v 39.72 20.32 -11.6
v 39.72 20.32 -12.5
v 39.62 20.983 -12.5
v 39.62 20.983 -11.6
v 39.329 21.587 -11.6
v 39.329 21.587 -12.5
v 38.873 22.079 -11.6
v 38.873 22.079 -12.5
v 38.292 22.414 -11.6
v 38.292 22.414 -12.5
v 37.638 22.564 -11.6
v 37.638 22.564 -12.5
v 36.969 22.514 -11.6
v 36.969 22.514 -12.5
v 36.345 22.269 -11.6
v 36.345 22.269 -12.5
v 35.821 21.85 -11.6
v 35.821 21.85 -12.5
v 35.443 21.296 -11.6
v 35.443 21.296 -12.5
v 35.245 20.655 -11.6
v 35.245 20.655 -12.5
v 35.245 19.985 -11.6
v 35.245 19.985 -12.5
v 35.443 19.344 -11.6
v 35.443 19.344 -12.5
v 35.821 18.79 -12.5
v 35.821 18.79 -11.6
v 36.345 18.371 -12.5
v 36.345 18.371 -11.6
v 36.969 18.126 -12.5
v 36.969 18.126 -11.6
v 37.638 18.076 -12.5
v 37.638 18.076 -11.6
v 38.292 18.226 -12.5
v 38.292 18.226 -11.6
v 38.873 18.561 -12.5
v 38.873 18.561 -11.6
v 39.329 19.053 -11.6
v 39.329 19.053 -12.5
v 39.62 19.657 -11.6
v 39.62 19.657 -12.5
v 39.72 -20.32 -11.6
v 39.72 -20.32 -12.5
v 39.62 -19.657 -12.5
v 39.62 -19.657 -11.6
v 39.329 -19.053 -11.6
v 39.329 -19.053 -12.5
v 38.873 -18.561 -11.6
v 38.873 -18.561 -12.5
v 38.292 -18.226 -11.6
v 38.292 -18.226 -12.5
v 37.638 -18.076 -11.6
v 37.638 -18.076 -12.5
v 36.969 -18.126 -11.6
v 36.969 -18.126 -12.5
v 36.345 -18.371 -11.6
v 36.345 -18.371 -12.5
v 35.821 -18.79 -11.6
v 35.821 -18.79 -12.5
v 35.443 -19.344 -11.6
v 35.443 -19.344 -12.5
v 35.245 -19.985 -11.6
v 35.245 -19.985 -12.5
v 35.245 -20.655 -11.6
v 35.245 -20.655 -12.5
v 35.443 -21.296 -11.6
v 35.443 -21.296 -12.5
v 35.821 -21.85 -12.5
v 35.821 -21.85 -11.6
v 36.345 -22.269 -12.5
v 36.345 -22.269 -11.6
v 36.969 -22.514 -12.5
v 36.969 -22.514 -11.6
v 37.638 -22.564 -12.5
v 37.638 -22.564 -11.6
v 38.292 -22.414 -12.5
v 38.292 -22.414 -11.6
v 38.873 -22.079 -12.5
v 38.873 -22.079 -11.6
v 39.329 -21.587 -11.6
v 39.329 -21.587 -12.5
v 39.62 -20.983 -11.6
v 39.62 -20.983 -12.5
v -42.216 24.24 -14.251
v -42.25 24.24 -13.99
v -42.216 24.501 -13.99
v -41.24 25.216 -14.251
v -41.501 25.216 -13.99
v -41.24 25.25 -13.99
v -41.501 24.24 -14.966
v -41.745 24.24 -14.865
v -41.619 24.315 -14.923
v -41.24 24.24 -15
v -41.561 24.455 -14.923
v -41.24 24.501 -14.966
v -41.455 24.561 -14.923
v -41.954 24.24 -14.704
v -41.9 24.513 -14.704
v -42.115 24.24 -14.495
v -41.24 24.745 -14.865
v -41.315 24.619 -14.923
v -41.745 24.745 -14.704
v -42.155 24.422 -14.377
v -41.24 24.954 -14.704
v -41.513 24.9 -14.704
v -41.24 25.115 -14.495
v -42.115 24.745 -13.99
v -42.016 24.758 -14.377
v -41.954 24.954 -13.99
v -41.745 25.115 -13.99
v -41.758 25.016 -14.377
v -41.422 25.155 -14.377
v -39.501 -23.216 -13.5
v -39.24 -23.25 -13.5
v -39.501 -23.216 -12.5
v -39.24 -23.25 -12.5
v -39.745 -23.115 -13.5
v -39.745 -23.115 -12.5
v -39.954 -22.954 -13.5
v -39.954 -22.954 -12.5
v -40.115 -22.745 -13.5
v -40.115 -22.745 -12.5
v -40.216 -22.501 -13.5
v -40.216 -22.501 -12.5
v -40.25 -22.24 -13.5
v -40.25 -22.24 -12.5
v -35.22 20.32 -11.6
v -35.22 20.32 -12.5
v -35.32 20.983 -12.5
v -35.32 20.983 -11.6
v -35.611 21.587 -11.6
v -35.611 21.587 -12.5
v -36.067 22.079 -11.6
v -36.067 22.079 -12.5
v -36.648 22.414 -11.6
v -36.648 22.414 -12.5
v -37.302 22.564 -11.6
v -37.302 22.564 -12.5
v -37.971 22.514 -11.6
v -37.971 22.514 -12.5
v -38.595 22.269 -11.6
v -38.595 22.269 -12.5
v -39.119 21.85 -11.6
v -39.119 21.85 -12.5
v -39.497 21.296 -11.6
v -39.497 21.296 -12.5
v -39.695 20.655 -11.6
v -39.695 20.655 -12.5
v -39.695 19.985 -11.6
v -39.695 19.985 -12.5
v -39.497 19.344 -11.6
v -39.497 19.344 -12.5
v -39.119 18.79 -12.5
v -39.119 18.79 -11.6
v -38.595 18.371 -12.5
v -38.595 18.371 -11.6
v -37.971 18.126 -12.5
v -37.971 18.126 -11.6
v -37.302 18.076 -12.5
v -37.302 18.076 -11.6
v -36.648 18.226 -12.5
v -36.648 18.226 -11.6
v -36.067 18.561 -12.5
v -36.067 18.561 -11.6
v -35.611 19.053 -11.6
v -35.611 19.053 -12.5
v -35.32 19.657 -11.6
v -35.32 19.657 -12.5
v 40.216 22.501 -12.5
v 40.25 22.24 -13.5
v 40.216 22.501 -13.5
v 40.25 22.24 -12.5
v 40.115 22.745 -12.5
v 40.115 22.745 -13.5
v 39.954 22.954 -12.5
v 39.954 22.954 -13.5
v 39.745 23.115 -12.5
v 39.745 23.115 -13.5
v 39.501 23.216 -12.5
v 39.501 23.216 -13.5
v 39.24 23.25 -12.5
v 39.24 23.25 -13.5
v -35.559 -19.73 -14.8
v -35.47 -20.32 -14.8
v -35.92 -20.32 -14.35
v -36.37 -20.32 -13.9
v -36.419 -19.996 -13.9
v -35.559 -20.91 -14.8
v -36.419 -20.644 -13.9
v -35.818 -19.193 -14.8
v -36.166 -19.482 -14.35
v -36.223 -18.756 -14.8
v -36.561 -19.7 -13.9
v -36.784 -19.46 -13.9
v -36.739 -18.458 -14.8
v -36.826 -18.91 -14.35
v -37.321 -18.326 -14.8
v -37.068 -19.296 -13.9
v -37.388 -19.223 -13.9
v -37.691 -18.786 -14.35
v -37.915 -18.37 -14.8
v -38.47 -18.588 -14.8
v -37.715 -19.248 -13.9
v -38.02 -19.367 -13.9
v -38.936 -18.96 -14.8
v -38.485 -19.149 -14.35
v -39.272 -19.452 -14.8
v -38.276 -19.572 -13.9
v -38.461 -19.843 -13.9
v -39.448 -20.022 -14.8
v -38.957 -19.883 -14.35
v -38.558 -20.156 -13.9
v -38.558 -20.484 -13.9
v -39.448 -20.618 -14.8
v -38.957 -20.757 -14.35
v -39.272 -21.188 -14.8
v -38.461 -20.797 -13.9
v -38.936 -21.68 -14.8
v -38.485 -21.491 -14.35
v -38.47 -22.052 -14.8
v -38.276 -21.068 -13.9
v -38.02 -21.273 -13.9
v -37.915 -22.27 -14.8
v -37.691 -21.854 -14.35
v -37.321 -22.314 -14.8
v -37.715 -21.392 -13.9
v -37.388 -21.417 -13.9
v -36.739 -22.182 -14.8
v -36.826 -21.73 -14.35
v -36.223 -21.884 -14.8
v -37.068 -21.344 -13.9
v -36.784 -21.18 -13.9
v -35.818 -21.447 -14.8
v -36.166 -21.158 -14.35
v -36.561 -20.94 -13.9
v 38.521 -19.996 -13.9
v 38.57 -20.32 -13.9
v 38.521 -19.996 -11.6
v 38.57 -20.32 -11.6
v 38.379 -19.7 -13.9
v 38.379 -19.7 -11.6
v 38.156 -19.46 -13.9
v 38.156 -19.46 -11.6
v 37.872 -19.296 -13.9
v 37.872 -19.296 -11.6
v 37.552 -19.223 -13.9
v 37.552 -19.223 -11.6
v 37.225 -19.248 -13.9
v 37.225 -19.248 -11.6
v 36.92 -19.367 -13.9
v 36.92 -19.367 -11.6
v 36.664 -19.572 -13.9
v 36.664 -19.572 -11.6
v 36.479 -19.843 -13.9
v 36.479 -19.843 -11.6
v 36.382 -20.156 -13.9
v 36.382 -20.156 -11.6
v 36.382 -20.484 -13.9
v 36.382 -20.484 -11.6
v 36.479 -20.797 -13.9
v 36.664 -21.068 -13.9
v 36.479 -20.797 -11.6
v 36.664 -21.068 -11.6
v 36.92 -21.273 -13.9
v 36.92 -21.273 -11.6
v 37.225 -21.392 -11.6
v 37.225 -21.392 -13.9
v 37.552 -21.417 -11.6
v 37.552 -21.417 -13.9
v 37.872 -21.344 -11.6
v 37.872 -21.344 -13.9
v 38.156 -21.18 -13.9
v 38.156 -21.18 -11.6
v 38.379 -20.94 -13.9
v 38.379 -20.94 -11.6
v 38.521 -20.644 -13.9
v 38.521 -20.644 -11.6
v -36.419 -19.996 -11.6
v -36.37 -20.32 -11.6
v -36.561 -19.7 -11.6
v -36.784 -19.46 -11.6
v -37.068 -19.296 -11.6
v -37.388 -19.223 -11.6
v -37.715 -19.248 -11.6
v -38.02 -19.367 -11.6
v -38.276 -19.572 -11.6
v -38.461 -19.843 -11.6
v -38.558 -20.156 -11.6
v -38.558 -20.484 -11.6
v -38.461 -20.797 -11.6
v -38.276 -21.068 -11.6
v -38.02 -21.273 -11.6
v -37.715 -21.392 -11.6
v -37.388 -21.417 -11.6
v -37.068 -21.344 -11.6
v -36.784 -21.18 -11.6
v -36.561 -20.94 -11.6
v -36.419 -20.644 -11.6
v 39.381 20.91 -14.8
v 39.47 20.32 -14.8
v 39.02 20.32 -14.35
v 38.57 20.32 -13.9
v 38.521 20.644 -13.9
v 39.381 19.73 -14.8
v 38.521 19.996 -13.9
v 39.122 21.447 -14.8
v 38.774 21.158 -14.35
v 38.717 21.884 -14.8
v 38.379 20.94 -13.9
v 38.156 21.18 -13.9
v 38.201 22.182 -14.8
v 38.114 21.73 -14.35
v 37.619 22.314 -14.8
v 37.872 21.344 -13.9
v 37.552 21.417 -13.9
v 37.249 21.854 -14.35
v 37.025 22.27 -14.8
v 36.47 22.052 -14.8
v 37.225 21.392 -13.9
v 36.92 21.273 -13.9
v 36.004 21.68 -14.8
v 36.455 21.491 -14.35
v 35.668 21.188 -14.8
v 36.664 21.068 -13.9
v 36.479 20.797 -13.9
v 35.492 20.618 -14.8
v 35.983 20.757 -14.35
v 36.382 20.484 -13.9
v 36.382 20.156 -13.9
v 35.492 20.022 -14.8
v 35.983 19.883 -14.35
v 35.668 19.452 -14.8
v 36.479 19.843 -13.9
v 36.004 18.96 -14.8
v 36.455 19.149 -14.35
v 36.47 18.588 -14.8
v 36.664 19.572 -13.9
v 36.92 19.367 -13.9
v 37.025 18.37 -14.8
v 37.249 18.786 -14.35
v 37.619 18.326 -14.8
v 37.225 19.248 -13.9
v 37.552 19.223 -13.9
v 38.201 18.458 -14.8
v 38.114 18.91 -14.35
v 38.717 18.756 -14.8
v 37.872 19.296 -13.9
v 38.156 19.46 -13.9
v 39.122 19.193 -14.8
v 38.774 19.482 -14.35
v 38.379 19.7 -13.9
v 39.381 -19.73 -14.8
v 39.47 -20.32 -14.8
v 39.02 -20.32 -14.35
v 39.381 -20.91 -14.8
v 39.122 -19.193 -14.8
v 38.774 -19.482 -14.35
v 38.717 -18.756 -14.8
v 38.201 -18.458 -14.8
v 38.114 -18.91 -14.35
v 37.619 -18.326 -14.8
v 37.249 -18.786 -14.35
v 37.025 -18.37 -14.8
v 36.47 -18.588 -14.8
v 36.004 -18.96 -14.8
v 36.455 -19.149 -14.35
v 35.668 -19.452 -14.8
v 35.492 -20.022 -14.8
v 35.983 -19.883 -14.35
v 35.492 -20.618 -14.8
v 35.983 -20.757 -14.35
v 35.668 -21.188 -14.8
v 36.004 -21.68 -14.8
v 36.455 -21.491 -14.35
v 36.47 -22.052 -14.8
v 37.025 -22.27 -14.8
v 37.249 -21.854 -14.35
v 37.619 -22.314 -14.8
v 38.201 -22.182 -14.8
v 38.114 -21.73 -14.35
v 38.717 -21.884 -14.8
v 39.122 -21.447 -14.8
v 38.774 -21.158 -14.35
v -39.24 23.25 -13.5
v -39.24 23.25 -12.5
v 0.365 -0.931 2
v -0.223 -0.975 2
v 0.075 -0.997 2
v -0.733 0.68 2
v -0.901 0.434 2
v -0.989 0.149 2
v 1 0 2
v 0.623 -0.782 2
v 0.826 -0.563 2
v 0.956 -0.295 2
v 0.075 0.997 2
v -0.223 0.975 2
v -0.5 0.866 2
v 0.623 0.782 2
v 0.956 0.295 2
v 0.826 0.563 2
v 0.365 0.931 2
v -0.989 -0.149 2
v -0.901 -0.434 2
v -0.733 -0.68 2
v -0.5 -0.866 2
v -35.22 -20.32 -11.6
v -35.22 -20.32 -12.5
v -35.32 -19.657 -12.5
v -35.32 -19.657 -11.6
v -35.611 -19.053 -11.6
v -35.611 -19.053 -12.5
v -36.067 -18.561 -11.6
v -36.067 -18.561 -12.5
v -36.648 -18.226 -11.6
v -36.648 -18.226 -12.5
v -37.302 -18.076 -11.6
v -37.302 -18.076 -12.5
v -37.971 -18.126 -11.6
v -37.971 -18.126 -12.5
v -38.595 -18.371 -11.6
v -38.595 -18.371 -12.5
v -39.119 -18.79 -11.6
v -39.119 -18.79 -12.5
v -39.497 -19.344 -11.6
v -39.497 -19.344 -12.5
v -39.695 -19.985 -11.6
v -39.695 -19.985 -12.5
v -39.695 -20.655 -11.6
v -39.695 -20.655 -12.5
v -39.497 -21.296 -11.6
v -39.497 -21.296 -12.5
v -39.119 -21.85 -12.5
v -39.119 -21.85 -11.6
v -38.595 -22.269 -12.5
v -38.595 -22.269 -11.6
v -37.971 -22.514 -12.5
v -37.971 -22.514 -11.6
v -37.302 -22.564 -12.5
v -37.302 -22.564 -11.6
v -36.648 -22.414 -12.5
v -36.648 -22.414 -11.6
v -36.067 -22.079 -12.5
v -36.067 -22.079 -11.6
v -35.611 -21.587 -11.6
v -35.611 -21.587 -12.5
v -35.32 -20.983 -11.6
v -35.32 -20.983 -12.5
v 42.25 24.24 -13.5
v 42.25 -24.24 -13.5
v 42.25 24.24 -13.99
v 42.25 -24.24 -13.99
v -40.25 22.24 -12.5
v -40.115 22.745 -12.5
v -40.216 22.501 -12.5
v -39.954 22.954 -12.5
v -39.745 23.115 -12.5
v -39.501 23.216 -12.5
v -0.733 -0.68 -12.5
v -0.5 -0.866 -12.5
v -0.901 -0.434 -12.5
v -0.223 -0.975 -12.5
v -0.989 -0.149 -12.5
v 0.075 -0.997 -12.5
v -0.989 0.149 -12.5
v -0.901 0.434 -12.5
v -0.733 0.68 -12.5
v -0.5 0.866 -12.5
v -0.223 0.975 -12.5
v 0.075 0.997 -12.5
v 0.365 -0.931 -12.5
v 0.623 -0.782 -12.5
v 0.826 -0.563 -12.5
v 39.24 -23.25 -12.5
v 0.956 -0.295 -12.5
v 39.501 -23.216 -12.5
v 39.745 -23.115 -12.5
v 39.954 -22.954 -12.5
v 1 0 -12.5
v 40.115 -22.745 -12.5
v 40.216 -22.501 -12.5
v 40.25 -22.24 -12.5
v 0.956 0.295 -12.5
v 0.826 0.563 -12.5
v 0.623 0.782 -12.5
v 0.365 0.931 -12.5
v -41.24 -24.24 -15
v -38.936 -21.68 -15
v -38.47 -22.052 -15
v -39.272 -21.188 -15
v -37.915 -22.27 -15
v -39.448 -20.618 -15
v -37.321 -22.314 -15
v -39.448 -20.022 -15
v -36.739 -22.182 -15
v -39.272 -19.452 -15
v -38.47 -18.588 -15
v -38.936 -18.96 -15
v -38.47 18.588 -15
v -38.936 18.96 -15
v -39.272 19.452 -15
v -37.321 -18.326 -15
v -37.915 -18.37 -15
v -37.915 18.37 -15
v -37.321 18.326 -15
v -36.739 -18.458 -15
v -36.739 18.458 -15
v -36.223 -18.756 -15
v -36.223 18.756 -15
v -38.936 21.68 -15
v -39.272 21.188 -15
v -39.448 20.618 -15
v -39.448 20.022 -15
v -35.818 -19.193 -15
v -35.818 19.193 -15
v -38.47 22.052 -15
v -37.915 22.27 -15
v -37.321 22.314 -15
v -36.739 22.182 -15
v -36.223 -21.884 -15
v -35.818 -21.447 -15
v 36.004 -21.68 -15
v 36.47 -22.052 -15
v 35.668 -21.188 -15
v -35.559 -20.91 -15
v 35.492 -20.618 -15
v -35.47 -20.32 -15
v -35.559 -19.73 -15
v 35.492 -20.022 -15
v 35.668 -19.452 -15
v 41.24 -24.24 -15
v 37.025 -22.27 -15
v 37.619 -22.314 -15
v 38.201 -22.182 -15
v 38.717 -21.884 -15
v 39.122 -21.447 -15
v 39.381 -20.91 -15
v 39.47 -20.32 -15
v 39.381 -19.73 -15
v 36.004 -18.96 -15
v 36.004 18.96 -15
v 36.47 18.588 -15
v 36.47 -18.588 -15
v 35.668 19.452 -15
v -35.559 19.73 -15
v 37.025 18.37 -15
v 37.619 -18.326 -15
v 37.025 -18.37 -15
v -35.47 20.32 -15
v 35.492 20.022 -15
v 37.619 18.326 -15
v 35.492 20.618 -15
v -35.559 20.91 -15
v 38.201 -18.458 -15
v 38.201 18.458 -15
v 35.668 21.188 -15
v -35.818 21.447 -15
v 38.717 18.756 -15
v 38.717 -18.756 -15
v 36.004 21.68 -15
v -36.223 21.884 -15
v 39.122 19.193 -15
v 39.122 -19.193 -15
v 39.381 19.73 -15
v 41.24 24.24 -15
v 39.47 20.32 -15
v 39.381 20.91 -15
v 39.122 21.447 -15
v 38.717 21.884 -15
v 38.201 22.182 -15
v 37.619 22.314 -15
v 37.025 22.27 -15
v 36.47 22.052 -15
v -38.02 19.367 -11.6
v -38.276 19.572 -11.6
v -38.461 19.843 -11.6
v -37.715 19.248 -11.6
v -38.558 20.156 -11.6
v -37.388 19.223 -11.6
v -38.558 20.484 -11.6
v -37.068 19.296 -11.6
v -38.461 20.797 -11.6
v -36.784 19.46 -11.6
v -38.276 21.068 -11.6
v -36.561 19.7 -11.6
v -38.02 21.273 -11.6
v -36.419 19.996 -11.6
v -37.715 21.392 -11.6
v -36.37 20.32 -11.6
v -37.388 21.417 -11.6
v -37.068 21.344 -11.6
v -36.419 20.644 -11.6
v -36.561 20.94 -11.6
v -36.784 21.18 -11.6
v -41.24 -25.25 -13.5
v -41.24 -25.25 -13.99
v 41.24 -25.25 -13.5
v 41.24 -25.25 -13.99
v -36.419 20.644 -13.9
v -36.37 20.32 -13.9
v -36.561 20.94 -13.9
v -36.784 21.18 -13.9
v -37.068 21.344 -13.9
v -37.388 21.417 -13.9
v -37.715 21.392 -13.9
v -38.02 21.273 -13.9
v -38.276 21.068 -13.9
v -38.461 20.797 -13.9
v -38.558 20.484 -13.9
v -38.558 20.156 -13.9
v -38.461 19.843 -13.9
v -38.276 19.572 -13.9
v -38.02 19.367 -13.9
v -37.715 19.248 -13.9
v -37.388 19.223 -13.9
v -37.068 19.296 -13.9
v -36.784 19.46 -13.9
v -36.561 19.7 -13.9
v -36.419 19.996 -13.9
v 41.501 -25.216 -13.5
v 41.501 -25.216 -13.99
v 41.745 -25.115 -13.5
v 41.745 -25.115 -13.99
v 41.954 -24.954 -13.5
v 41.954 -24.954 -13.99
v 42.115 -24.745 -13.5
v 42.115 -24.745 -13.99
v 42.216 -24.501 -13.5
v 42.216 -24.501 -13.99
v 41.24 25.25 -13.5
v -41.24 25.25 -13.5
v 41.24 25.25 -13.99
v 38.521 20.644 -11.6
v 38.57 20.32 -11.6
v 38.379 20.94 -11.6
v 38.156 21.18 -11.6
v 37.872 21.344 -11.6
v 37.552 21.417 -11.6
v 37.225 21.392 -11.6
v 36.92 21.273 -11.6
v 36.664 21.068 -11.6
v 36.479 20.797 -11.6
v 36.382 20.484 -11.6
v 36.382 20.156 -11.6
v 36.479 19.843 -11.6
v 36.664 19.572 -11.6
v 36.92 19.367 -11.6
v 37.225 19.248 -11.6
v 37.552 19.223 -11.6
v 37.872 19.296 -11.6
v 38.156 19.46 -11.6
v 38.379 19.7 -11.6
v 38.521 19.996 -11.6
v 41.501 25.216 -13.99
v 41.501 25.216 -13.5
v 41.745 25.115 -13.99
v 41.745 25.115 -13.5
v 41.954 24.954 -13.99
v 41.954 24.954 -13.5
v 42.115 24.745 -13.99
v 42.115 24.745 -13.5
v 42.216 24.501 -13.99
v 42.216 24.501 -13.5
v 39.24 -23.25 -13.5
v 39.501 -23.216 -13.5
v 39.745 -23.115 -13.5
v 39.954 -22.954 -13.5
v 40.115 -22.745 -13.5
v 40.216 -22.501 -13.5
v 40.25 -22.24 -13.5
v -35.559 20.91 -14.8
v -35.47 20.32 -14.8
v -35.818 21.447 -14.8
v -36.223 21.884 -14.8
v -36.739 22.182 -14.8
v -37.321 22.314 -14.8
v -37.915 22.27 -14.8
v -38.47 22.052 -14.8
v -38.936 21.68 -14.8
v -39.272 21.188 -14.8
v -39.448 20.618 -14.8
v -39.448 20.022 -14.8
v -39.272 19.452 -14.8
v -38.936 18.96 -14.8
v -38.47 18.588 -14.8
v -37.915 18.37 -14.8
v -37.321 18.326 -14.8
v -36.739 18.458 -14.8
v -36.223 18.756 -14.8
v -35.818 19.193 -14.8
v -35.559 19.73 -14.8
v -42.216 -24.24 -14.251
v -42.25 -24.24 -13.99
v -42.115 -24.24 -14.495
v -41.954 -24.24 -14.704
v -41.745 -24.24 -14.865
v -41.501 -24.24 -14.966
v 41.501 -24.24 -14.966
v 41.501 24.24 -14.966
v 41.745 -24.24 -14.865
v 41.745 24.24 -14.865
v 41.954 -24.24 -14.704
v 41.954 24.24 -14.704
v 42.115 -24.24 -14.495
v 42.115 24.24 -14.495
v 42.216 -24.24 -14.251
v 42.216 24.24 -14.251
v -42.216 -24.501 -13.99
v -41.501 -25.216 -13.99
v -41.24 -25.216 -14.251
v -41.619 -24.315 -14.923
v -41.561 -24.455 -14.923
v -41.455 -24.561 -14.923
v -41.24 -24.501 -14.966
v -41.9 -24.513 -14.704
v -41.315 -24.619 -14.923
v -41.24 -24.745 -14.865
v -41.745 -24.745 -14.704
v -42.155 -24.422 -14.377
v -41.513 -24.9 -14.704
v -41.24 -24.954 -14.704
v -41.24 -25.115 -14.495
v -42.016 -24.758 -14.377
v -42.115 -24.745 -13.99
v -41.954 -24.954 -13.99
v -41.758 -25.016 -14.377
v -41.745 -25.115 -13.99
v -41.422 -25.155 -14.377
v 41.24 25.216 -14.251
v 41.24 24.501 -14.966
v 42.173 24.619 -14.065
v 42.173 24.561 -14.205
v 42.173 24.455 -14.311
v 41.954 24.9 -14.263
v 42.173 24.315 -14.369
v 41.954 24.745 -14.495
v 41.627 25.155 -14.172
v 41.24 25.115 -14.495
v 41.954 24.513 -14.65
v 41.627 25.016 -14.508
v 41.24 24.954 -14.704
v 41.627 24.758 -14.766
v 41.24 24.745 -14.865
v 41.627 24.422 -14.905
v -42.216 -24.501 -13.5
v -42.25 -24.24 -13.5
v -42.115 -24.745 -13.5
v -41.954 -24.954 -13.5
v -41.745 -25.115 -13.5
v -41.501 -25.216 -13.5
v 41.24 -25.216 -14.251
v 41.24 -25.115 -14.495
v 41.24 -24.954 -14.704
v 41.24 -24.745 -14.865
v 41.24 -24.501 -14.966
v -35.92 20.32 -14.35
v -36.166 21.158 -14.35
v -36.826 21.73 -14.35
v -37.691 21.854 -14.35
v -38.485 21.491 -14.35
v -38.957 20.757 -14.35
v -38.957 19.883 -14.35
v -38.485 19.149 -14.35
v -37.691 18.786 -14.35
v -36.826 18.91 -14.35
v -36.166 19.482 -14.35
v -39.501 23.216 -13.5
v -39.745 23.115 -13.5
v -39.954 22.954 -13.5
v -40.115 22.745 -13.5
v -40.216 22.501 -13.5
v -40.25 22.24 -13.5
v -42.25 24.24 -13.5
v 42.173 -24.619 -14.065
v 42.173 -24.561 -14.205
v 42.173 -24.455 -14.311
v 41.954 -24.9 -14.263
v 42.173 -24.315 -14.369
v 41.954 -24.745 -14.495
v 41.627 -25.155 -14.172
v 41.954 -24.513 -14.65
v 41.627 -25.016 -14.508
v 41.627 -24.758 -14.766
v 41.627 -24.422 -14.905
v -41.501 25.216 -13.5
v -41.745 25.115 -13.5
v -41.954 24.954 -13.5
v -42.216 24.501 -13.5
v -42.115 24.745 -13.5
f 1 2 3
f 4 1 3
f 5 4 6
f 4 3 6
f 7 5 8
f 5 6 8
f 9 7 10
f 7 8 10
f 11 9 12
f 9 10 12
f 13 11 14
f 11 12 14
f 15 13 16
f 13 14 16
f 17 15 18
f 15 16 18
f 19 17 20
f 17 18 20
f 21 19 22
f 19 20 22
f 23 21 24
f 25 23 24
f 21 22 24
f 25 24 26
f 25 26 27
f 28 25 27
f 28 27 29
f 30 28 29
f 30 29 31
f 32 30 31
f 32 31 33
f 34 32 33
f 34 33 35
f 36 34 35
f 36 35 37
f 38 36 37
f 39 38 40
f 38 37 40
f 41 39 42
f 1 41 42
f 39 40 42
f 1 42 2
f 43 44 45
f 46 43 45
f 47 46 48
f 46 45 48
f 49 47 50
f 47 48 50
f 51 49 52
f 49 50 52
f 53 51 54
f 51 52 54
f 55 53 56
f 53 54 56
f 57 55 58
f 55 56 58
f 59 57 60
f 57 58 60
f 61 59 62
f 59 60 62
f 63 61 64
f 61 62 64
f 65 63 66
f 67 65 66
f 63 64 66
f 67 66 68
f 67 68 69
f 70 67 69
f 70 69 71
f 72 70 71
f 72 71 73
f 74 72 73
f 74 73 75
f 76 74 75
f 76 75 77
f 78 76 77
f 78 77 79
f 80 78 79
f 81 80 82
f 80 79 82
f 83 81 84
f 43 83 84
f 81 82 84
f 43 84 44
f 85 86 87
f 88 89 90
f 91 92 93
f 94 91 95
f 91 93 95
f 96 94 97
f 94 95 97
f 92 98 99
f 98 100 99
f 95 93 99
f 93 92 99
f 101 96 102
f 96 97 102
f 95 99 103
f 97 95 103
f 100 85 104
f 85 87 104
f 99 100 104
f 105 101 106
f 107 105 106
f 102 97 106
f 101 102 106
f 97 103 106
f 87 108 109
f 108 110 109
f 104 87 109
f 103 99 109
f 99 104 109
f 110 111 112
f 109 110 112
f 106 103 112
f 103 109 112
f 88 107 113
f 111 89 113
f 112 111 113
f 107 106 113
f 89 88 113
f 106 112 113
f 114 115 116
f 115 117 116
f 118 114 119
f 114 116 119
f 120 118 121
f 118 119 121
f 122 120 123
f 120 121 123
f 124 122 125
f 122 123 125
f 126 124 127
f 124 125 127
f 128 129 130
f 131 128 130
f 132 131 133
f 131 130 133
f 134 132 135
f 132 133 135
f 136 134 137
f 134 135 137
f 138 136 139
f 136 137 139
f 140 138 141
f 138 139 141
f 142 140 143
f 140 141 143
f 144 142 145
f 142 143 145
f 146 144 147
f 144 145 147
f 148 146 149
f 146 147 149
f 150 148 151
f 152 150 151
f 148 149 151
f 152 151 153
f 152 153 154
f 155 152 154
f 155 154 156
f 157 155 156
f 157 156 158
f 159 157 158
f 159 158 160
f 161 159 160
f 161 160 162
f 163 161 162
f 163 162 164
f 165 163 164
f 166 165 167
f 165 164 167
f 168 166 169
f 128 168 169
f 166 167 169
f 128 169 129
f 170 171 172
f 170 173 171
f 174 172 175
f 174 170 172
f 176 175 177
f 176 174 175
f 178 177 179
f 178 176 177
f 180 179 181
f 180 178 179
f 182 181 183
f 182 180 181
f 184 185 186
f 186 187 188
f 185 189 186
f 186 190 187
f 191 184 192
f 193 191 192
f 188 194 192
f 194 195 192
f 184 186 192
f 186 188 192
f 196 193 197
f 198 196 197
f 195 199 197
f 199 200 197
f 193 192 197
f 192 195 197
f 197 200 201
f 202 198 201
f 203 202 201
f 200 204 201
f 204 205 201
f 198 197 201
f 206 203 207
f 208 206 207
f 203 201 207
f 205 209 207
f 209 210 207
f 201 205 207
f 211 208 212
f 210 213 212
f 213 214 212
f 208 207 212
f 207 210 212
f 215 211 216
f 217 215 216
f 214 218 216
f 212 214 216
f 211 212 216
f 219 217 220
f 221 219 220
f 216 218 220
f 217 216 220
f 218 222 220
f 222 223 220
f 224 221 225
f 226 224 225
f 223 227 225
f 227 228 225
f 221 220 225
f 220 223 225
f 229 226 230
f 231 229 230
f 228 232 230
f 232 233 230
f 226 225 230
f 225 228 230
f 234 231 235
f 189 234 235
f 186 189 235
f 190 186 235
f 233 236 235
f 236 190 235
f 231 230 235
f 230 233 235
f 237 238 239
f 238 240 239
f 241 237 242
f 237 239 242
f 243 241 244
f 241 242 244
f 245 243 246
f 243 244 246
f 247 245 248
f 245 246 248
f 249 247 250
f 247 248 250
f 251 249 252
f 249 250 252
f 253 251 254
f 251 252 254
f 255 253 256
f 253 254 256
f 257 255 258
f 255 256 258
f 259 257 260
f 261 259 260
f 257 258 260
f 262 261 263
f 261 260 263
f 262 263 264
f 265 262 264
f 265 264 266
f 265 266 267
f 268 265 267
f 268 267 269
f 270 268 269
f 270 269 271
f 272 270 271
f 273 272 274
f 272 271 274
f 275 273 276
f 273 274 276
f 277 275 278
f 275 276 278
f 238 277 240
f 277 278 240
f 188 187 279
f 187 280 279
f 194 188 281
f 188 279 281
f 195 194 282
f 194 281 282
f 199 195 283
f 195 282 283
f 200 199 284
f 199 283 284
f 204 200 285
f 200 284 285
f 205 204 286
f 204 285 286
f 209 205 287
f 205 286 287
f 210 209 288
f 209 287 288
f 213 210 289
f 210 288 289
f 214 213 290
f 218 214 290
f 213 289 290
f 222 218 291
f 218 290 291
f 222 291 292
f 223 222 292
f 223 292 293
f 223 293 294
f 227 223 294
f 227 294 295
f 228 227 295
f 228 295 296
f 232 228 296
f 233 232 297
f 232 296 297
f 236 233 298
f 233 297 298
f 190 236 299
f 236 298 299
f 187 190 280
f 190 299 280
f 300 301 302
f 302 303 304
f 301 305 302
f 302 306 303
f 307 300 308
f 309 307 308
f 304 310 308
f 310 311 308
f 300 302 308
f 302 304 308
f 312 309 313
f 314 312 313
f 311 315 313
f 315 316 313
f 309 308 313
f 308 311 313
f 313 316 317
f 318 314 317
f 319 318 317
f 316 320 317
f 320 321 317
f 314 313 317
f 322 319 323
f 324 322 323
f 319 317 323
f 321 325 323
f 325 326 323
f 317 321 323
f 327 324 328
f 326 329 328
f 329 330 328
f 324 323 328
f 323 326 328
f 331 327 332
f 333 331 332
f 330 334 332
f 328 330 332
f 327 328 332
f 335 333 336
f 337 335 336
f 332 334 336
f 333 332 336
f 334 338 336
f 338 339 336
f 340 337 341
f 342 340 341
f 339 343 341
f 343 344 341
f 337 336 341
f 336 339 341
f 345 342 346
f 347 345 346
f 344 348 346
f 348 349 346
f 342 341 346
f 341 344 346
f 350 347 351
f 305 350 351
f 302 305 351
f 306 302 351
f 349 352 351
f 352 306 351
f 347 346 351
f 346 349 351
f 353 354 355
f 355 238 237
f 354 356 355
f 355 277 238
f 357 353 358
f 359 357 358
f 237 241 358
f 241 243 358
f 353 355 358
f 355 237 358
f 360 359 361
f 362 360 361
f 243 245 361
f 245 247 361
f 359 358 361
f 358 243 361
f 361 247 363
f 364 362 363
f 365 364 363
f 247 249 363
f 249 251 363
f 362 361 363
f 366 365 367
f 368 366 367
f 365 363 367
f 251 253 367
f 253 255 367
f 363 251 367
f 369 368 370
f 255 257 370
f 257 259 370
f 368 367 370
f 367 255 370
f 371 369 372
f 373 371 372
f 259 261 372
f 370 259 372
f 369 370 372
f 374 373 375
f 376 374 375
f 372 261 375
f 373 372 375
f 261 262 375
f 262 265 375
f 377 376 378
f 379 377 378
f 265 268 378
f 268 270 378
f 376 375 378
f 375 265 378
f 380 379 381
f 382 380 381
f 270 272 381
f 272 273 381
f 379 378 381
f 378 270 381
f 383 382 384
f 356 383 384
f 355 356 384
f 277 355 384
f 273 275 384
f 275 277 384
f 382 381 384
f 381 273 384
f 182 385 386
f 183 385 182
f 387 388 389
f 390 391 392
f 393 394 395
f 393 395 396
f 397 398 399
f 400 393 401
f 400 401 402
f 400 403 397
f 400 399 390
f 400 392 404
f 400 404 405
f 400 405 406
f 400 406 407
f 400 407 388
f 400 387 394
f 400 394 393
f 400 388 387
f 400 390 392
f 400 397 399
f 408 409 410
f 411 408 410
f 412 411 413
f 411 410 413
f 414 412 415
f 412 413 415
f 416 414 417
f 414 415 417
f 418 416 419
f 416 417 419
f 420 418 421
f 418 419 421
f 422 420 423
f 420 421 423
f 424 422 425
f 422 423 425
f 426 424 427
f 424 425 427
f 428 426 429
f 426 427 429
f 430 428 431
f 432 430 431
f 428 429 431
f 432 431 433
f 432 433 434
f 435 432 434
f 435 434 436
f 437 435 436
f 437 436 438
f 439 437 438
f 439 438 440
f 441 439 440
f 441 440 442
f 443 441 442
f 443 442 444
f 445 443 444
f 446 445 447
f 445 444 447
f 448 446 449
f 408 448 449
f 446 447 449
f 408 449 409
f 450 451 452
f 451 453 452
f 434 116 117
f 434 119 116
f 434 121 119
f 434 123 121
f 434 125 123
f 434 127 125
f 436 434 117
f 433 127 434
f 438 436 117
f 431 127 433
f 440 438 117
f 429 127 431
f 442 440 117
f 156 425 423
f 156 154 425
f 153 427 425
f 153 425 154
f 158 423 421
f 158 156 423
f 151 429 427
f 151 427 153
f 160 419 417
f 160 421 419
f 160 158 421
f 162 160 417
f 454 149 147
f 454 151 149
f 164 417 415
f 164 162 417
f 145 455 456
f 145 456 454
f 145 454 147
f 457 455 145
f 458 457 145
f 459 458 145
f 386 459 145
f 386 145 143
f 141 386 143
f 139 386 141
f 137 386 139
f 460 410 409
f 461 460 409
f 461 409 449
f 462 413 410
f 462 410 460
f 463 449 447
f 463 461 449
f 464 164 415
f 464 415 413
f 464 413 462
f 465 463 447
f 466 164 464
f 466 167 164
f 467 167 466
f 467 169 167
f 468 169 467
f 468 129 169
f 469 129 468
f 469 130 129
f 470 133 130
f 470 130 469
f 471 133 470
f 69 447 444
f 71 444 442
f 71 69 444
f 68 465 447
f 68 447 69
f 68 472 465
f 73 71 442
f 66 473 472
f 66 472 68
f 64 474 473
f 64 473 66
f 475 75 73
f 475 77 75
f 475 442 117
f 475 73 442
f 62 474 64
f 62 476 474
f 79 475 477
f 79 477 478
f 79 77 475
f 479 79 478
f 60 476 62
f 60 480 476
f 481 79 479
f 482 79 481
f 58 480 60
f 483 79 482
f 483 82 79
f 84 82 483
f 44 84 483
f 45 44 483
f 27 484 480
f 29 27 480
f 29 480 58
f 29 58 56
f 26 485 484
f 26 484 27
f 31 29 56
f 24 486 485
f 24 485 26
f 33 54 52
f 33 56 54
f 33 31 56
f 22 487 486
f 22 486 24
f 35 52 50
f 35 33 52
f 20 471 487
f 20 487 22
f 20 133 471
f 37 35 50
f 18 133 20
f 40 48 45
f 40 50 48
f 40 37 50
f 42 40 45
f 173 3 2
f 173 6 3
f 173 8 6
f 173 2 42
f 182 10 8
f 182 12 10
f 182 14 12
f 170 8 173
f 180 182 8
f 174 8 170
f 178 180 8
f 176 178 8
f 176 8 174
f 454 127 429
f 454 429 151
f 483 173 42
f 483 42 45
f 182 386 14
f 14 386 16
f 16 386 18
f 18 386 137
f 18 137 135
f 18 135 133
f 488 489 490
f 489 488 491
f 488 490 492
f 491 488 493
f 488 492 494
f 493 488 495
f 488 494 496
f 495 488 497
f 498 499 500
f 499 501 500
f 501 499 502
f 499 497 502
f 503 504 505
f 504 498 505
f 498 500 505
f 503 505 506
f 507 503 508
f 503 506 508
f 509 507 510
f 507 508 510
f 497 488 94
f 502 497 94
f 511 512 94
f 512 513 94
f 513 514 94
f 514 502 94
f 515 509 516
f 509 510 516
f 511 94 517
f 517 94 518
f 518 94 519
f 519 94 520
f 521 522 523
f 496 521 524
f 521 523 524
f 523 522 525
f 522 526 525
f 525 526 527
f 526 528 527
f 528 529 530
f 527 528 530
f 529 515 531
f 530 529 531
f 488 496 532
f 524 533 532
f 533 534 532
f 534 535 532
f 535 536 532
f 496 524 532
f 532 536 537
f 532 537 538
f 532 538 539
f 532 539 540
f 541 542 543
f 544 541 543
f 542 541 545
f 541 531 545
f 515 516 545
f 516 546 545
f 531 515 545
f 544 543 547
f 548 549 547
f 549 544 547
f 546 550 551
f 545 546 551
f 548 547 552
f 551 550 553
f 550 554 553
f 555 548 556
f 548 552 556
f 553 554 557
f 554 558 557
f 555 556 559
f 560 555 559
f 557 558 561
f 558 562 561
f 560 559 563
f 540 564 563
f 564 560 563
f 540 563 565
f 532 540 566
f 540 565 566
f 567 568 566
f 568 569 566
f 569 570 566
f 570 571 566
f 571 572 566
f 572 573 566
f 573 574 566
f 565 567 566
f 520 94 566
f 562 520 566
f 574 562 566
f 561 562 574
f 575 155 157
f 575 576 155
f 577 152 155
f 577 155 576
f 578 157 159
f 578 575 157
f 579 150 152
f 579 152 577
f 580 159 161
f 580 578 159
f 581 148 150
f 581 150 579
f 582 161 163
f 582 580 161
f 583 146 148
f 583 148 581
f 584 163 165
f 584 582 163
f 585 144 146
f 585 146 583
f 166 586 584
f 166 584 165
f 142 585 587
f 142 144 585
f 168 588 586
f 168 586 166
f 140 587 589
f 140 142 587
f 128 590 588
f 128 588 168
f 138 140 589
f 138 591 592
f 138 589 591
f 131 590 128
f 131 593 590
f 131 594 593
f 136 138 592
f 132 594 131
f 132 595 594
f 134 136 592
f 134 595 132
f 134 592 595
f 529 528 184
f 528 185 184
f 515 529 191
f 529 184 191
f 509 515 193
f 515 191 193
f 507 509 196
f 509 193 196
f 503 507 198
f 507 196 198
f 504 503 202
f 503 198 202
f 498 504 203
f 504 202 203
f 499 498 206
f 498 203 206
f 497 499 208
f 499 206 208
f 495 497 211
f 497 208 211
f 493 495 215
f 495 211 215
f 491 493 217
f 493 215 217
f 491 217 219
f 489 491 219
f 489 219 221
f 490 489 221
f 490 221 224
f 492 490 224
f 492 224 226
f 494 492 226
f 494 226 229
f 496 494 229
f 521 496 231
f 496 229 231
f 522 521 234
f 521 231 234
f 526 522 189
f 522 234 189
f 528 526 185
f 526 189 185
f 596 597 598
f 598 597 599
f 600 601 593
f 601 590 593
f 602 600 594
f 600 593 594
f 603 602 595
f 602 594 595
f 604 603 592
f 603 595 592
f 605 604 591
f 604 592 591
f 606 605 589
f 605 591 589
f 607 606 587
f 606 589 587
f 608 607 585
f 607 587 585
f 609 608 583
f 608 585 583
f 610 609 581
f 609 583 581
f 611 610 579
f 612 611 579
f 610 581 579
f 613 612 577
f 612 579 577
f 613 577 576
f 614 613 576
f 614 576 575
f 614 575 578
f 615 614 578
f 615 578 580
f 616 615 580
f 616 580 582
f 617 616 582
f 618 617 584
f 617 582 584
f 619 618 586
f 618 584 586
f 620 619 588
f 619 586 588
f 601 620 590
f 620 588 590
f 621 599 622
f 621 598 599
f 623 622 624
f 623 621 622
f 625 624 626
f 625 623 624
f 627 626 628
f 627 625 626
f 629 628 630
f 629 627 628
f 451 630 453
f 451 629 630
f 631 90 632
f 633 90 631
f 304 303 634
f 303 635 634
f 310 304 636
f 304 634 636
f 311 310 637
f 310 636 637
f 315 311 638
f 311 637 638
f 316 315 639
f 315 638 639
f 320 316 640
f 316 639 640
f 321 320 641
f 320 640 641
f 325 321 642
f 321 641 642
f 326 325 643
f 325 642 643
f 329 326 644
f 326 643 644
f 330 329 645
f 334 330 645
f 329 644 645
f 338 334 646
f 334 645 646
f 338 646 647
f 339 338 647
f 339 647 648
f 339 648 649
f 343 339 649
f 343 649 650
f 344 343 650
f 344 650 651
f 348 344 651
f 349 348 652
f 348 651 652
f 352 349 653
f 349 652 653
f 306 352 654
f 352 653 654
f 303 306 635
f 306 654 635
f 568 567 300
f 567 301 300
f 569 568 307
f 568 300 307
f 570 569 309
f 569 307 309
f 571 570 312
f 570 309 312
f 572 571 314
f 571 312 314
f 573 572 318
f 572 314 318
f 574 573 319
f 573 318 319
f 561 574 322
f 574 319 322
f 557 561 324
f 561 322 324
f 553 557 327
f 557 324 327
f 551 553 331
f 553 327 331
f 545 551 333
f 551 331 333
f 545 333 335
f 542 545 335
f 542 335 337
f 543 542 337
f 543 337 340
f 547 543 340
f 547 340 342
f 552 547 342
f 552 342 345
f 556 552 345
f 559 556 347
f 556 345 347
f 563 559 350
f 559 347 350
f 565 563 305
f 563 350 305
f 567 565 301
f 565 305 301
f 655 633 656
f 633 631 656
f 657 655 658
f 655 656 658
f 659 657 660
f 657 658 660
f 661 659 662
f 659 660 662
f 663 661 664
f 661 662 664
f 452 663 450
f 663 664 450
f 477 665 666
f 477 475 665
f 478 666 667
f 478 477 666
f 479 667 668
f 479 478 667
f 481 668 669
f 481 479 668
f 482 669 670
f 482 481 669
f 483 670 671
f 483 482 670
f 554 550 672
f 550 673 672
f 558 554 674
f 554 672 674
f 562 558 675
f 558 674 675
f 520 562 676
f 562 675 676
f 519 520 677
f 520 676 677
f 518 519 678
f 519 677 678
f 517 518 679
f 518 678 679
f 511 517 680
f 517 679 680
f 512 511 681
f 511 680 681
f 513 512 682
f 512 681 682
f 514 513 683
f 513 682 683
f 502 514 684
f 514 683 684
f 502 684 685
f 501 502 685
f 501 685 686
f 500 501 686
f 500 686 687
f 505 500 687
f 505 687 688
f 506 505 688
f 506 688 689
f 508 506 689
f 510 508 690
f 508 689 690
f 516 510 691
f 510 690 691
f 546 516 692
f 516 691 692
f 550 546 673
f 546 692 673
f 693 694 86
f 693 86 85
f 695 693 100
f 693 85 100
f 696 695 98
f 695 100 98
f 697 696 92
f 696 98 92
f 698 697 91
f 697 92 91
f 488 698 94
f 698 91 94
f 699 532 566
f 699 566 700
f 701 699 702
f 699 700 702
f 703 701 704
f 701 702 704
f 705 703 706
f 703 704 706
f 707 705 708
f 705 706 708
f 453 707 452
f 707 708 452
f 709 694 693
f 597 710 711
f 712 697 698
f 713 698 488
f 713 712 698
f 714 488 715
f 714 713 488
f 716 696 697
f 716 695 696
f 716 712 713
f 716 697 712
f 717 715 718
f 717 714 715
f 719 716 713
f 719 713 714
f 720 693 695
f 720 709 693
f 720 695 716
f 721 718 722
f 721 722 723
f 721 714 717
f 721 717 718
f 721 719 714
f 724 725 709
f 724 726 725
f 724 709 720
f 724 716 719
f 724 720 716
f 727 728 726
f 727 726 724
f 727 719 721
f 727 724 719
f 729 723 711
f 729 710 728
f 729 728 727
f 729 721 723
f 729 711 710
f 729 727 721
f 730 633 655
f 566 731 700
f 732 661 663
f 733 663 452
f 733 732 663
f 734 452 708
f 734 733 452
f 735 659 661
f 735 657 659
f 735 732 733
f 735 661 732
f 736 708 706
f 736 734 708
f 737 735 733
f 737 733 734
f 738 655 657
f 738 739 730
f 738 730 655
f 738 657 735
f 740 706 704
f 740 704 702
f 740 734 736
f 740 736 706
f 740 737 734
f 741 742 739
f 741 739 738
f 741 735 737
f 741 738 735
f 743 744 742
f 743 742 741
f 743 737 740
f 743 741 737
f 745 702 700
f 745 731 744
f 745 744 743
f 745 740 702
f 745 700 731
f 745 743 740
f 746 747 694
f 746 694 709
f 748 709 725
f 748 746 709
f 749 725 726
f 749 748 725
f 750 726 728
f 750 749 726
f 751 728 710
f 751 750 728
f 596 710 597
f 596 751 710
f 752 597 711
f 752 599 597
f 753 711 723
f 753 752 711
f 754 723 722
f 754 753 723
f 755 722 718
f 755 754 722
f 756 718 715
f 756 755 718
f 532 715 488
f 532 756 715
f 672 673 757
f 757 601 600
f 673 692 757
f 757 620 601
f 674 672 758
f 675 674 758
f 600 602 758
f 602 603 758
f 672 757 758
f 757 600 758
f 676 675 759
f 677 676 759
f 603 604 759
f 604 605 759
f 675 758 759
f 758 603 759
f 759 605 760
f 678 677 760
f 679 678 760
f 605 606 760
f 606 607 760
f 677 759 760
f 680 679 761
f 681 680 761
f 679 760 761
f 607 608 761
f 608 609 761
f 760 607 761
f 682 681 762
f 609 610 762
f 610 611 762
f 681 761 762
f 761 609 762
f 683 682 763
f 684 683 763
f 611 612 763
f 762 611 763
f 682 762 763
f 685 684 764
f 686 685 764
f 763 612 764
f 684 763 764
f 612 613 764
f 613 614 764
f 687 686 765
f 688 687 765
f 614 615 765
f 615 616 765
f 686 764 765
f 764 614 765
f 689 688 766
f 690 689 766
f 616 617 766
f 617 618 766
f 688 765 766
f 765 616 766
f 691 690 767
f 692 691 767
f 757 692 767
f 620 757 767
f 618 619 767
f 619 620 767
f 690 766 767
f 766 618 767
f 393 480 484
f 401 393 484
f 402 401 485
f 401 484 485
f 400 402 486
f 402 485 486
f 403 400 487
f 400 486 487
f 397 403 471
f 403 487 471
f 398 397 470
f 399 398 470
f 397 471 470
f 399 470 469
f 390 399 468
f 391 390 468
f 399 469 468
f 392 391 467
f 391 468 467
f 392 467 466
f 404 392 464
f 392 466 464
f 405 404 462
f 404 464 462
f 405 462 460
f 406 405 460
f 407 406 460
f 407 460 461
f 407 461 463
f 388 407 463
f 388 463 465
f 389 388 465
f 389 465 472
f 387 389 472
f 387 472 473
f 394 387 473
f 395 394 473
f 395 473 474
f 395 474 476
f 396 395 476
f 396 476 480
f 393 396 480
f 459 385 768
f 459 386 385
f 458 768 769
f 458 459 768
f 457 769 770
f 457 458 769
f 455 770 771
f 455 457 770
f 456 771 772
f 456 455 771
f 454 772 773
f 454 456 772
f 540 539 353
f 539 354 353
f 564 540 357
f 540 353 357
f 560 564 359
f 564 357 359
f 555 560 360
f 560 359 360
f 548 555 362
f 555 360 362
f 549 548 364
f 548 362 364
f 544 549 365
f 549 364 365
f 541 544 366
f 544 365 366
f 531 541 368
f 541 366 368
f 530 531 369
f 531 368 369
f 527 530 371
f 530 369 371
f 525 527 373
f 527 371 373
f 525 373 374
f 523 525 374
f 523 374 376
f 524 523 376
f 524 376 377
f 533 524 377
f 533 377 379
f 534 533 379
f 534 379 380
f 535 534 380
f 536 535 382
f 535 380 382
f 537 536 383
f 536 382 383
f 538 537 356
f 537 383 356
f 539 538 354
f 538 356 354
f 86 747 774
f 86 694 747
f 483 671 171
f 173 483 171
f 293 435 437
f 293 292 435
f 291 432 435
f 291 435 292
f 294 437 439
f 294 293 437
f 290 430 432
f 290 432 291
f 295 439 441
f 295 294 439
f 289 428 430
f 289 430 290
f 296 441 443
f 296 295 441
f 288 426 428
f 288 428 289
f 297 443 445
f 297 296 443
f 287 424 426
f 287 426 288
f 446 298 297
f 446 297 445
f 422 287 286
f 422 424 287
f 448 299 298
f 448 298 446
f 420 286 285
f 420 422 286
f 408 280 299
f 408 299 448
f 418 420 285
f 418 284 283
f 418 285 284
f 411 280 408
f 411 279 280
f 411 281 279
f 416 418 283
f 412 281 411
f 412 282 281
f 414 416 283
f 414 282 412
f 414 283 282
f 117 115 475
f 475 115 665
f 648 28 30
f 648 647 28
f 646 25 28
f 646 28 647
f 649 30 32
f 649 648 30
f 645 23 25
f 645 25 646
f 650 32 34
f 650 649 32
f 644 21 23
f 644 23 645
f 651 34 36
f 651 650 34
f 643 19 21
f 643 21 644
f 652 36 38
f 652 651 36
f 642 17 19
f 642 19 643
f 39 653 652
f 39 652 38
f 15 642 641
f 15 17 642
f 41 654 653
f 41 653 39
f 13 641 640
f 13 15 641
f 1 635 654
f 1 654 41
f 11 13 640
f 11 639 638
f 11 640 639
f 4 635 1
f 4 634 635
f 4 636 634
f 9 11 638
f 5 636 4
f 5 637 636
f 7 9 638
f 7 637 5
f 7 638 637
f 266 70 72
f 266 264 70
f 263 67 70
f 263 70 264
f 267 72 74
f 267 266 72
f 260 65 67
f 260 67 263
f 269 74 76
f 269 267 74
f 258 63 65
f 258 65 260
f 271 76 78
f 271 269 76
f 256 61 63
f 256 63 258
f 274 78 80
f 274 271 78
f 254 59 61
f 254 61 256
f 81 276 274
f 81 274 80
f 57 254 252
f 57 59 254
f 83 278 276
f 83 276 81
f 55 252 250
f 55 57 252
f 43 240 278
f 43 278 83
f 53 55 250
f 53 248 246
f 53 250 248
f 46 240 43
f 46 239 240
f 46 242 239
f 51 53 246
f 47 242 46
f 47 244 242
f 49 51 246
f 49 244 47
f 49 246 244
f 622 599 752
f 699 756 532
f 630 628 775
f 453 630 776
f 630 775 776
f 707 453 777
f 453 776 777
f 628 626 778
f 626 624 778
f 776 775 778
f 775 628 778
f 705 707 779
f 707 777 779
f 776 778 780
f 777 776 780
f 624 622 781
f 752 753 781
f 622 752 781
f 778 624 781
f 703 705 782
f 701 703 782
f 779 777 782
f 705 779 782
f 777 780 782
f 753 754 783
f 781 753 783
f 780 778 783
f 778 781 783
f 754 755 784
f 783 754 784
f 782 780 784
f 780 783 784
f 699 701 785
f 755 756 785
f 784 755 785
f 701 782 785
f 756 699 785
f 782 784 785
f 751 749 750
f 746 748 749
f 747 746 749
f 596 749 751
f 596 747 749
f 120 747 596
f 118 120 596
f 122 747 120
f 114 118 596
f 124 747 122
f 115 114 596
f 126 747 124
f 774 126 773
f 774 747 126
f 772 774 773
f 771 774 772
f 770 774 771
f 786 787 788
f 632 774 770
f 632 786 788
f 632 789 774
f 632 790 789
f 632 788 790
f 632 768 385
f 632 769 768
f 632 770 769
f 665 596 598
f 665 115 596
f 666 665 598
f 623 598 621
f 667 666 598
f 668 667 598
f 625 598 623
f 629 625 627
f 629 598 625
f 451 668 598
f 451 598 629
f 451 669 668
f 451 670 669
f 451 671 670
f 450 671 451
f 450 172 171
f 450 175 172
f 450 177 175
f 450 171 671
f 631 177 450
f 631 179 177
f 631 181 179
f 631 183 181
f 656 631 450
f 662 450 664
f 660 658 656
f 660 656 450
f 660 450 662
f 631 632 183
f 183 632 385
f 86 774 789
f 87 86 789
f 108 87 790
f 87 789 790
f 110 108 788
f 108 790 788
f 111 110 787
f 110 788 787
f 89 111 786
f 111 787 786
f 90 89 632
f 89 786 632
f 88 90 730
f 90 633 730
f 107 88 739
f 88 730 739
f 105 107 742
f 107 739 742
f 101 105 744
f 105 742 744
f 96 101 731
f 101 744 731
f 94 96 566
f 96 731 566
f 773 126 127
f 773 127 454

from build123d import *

# Parameters (mm, degrees)
CYLINDER025_R     = 1
CYLINDER025_DEPTH = 15
CYLINDER022_R     = 2.25
CYLINDER022_DEPTH = 0.9
CYLINDER023_R     = 2.25
CYLINDER023_DEPTH = 0.9
CYLINDER024_R     = 2.25
CYLINDER024_DEPTH = 0.9
CYLINDER021_R     = 2.25
CYLINDER021_DEPTH = 0.9
BOX005_W          = 84.5
BOX005_H          = 50.5
BOX005_DEPTH      = 1.5
BOX004_W          = 80.5
BOX004_H          = 46.5
BOX004_DEPTH      = 1
FILLET001_R       = 1.01


with BuildPart() as hack:
    # Cylinder025 → Cylinder025 (new body)
    with BuildSketch(Plane.XY.offset(-13)):
        Circle(CYLINDER025_R)
    extrude(amount=CYLINDER025_DEPTH)


with BuildPart() as bottom_screw_hole_a:
    # Sketch → Revolution (revolve)
    with BuildSketch(Plane.XZ):
        Polygon((0, 0), (2, 0), (2, 0.2), (1.1, 1.1), (1.1, 3.4), (0, 3.4), align=None)
    revolve(axis=Axis((0, 0, 0), (0, 0, 1)))


with BuildPart() as bottom_screw_hole_a_1:
    # Body placement: moved
    add(bottom_screw_hole_a.part.moved(Location((-37.47, -20.32, 0))))


with BuildPart() as bottom_screw_hole_b:
    # Body001 base: copy of bottom_screw_hole_a
    add(bottom_screw_hole_a_1.part)


with BuildPart() as bottom_screw_hole_b_1:
    # Clone placement: moved
    add(bottom_screw_hole_b.part.moved(Location((37.47, 20.32, 0))))


with BuildPart() as bottom_screw_hole_b_2:
    # Body001 placement: moved
    add(bottom_screw_hole_b_1.part.moved(Location((-37.47, 20.32, 0))))


with BuildPart() as bottom_screw_hole_c:
    # Body002 base: copy of bottom_screw_hole_a
    add(bottom_screw_hole_a_1.part)


with BuildPart() as bottom_screw_hole_c_1:
    # Clone001 placement: moved
    add(bottom_screw_hole_c.part.moved(Location((37.47, 20.32, 0))))


with BuildPart() as bottom_screw_hole_c_2:
    # Body002 placement: moved
    add(bottom_screw_hole_c_1.part.moved(Location((37.47, 20.32, 0))))


with BuildPart() as bottom_screw_hole_d:
    # Body003 base: copy of bottom_screw_hole_a
    add(bottom_screw_hole_a_1.part)


with BuildPart() as bottom_screw_hole_d_1:
    # Clone002 placement: moved
    add(bottom_screw_hole_d.part.moved(Location((37.47, 20.32, 0))))


with BuildPart() as bottom_screw_hole_d_2:
    # Body003 placement: moved
    add(bottom_screw_hole_d_1.part.moved(Location((37.47, -20.32, 0))))


with BuildPart() as bottom_screw_holes:
    # Fusion016 base: copy of bottom_screw_hole_a
    add(bottom_screw_hole_a_1.part)

    # Fusion016: union bottom_screw_hole_b, bottom_screw_hole_c, bottom_screw_hole_d
    add(bottom_screw_hole_b_2.part)
    add(bottom_screw_hole_c_2.part)
    add(bottom_screw_hole_d_2.part)


with BuildPart() as screw_column_b:
    # Cylinder022 → Cylinder022 (new body)
    with BuildSketch(Plane(origin=(-37.47, -20.32, 0), x_dir=(1, 0, 0), z_dir=(0, 0, 1))):
        Circle(CYLINDER022_R)
    extrude(amount=CYLINDER022_DEPTH)


with BuildPart() as screw_column_c:
    # Cylinder023 → Cylinder023 (new body)
    with BuildSketch(Plane(origin=(37.47, 20.32, 0), x_dir=(1, 0, 0), z_dir=(0, 0, 1))):
        Circle(CYLINDER023_R)
    extrude(amount=CYLINDER023_DEPTH)


with BuildPart() as screw_column_d:
    # Cylinder024 → Cylinder024 (new body)
    with BuildSketch(Plane(origin=(37.47, -20.32, 0), x_dir=(1, 0, 0), z_dir=(0, 0, 1))):
        Circle(CYLINDER024_R)
    extrude(amount=CYLINDER024_DEPTH)


with BuildPart() as screw_columns:
    # Cylinder021 → Cylinder021 (new body)
    with BuildSketch(Plane(origin=(-37.47, 20.32, 0), x_dir=(1, 0, 0), z_dir=(0, 0, 1))):
        Circle(CYLINDER021_R)
    extrude(amount=CYLINDER021_DEPTH)

    # Fusion011: union screw_column_b, screw_column_c, screw_column_d
    add(screw_column_b.part)
    add(screw_column_c.part)
    add(screw_column_d.part)


with BuildPart() as screw_columns_1:
    # Fusion011 placement: moved
    add(screw_columns.part.moved(Location((0, 0, 2.5))))


with BuildPart() as external_bottom:
    # Box005 → Box005 (new body)
    with BuildSketch(Plane(origin=(-2, -2, 0), x_dir=(1, 0, 0), z_dir=(0, 0, 1))):
        with Locations((42.25, 25.25)):
            Rectangle(BOX005_W, BOX005_H)
    extrude(amount=BOX005_DEPTH)


with BuildPart() as bottom_body_jlcpcb:
    # Box004 → Box004 (new body)
    with BuildSketch(Plane.XY.offset(1.5)):
        with Locations((40.25, 23.25)):
            Rectangle(BOX004_W, BOX004_H)
    extrude(amount=BOX004_DEPTH)

    # Fusion013: union external_bottom
    add(external_bottom.part)


with BuildPart() as bottom_body_jlcpcb_1:
    # Fusion013 placement: moved
    add(bottom_body_jlcpcb.part.moved(Location((-40.25, -23.25, 0))))

    # Fusion014: union screw_columns
    add(screw_columns_1.part)

    # Cut014: cut bottom_screw_holes
    add(bottom_screw_holes.part, mode=Mode.SUBTRACT)

    # Fillet001
    fillet001_edges = [bottom_body_jlcpcb_1.edges().sort_by_distance(p)[0] for p in [
        (-42.25, -25.25, 0.75),
        (-42.25, 25.25, 0.75),
        (-42.25, 0, 0),
        (0, -25.25, 0),
        (42.25, -25.25, 0.75),
        (0, 25.25, 0),
        (42.25, 25.25, 0.75),
        (42.25, 0, 0),
        (-40.25, -23.25, 2),
        (-40.25, 23.25, 2),
        (40.25, -23.25, 2),
        (40.25, 23.25, 2),
    ]]
    fillet(fillet001_edges, radius=FILLET001_R)


with BuildPart() as bottom_body_jlcpcb_2:
    # Fillet001 placement: moved
    add(bottom_body_jlcpcb_1.part.moved(Location((0, 0, -15))))

    # Fusion017: union hack
    add(hack.part)


solid = bottom_body_jlcpcb_2.part
